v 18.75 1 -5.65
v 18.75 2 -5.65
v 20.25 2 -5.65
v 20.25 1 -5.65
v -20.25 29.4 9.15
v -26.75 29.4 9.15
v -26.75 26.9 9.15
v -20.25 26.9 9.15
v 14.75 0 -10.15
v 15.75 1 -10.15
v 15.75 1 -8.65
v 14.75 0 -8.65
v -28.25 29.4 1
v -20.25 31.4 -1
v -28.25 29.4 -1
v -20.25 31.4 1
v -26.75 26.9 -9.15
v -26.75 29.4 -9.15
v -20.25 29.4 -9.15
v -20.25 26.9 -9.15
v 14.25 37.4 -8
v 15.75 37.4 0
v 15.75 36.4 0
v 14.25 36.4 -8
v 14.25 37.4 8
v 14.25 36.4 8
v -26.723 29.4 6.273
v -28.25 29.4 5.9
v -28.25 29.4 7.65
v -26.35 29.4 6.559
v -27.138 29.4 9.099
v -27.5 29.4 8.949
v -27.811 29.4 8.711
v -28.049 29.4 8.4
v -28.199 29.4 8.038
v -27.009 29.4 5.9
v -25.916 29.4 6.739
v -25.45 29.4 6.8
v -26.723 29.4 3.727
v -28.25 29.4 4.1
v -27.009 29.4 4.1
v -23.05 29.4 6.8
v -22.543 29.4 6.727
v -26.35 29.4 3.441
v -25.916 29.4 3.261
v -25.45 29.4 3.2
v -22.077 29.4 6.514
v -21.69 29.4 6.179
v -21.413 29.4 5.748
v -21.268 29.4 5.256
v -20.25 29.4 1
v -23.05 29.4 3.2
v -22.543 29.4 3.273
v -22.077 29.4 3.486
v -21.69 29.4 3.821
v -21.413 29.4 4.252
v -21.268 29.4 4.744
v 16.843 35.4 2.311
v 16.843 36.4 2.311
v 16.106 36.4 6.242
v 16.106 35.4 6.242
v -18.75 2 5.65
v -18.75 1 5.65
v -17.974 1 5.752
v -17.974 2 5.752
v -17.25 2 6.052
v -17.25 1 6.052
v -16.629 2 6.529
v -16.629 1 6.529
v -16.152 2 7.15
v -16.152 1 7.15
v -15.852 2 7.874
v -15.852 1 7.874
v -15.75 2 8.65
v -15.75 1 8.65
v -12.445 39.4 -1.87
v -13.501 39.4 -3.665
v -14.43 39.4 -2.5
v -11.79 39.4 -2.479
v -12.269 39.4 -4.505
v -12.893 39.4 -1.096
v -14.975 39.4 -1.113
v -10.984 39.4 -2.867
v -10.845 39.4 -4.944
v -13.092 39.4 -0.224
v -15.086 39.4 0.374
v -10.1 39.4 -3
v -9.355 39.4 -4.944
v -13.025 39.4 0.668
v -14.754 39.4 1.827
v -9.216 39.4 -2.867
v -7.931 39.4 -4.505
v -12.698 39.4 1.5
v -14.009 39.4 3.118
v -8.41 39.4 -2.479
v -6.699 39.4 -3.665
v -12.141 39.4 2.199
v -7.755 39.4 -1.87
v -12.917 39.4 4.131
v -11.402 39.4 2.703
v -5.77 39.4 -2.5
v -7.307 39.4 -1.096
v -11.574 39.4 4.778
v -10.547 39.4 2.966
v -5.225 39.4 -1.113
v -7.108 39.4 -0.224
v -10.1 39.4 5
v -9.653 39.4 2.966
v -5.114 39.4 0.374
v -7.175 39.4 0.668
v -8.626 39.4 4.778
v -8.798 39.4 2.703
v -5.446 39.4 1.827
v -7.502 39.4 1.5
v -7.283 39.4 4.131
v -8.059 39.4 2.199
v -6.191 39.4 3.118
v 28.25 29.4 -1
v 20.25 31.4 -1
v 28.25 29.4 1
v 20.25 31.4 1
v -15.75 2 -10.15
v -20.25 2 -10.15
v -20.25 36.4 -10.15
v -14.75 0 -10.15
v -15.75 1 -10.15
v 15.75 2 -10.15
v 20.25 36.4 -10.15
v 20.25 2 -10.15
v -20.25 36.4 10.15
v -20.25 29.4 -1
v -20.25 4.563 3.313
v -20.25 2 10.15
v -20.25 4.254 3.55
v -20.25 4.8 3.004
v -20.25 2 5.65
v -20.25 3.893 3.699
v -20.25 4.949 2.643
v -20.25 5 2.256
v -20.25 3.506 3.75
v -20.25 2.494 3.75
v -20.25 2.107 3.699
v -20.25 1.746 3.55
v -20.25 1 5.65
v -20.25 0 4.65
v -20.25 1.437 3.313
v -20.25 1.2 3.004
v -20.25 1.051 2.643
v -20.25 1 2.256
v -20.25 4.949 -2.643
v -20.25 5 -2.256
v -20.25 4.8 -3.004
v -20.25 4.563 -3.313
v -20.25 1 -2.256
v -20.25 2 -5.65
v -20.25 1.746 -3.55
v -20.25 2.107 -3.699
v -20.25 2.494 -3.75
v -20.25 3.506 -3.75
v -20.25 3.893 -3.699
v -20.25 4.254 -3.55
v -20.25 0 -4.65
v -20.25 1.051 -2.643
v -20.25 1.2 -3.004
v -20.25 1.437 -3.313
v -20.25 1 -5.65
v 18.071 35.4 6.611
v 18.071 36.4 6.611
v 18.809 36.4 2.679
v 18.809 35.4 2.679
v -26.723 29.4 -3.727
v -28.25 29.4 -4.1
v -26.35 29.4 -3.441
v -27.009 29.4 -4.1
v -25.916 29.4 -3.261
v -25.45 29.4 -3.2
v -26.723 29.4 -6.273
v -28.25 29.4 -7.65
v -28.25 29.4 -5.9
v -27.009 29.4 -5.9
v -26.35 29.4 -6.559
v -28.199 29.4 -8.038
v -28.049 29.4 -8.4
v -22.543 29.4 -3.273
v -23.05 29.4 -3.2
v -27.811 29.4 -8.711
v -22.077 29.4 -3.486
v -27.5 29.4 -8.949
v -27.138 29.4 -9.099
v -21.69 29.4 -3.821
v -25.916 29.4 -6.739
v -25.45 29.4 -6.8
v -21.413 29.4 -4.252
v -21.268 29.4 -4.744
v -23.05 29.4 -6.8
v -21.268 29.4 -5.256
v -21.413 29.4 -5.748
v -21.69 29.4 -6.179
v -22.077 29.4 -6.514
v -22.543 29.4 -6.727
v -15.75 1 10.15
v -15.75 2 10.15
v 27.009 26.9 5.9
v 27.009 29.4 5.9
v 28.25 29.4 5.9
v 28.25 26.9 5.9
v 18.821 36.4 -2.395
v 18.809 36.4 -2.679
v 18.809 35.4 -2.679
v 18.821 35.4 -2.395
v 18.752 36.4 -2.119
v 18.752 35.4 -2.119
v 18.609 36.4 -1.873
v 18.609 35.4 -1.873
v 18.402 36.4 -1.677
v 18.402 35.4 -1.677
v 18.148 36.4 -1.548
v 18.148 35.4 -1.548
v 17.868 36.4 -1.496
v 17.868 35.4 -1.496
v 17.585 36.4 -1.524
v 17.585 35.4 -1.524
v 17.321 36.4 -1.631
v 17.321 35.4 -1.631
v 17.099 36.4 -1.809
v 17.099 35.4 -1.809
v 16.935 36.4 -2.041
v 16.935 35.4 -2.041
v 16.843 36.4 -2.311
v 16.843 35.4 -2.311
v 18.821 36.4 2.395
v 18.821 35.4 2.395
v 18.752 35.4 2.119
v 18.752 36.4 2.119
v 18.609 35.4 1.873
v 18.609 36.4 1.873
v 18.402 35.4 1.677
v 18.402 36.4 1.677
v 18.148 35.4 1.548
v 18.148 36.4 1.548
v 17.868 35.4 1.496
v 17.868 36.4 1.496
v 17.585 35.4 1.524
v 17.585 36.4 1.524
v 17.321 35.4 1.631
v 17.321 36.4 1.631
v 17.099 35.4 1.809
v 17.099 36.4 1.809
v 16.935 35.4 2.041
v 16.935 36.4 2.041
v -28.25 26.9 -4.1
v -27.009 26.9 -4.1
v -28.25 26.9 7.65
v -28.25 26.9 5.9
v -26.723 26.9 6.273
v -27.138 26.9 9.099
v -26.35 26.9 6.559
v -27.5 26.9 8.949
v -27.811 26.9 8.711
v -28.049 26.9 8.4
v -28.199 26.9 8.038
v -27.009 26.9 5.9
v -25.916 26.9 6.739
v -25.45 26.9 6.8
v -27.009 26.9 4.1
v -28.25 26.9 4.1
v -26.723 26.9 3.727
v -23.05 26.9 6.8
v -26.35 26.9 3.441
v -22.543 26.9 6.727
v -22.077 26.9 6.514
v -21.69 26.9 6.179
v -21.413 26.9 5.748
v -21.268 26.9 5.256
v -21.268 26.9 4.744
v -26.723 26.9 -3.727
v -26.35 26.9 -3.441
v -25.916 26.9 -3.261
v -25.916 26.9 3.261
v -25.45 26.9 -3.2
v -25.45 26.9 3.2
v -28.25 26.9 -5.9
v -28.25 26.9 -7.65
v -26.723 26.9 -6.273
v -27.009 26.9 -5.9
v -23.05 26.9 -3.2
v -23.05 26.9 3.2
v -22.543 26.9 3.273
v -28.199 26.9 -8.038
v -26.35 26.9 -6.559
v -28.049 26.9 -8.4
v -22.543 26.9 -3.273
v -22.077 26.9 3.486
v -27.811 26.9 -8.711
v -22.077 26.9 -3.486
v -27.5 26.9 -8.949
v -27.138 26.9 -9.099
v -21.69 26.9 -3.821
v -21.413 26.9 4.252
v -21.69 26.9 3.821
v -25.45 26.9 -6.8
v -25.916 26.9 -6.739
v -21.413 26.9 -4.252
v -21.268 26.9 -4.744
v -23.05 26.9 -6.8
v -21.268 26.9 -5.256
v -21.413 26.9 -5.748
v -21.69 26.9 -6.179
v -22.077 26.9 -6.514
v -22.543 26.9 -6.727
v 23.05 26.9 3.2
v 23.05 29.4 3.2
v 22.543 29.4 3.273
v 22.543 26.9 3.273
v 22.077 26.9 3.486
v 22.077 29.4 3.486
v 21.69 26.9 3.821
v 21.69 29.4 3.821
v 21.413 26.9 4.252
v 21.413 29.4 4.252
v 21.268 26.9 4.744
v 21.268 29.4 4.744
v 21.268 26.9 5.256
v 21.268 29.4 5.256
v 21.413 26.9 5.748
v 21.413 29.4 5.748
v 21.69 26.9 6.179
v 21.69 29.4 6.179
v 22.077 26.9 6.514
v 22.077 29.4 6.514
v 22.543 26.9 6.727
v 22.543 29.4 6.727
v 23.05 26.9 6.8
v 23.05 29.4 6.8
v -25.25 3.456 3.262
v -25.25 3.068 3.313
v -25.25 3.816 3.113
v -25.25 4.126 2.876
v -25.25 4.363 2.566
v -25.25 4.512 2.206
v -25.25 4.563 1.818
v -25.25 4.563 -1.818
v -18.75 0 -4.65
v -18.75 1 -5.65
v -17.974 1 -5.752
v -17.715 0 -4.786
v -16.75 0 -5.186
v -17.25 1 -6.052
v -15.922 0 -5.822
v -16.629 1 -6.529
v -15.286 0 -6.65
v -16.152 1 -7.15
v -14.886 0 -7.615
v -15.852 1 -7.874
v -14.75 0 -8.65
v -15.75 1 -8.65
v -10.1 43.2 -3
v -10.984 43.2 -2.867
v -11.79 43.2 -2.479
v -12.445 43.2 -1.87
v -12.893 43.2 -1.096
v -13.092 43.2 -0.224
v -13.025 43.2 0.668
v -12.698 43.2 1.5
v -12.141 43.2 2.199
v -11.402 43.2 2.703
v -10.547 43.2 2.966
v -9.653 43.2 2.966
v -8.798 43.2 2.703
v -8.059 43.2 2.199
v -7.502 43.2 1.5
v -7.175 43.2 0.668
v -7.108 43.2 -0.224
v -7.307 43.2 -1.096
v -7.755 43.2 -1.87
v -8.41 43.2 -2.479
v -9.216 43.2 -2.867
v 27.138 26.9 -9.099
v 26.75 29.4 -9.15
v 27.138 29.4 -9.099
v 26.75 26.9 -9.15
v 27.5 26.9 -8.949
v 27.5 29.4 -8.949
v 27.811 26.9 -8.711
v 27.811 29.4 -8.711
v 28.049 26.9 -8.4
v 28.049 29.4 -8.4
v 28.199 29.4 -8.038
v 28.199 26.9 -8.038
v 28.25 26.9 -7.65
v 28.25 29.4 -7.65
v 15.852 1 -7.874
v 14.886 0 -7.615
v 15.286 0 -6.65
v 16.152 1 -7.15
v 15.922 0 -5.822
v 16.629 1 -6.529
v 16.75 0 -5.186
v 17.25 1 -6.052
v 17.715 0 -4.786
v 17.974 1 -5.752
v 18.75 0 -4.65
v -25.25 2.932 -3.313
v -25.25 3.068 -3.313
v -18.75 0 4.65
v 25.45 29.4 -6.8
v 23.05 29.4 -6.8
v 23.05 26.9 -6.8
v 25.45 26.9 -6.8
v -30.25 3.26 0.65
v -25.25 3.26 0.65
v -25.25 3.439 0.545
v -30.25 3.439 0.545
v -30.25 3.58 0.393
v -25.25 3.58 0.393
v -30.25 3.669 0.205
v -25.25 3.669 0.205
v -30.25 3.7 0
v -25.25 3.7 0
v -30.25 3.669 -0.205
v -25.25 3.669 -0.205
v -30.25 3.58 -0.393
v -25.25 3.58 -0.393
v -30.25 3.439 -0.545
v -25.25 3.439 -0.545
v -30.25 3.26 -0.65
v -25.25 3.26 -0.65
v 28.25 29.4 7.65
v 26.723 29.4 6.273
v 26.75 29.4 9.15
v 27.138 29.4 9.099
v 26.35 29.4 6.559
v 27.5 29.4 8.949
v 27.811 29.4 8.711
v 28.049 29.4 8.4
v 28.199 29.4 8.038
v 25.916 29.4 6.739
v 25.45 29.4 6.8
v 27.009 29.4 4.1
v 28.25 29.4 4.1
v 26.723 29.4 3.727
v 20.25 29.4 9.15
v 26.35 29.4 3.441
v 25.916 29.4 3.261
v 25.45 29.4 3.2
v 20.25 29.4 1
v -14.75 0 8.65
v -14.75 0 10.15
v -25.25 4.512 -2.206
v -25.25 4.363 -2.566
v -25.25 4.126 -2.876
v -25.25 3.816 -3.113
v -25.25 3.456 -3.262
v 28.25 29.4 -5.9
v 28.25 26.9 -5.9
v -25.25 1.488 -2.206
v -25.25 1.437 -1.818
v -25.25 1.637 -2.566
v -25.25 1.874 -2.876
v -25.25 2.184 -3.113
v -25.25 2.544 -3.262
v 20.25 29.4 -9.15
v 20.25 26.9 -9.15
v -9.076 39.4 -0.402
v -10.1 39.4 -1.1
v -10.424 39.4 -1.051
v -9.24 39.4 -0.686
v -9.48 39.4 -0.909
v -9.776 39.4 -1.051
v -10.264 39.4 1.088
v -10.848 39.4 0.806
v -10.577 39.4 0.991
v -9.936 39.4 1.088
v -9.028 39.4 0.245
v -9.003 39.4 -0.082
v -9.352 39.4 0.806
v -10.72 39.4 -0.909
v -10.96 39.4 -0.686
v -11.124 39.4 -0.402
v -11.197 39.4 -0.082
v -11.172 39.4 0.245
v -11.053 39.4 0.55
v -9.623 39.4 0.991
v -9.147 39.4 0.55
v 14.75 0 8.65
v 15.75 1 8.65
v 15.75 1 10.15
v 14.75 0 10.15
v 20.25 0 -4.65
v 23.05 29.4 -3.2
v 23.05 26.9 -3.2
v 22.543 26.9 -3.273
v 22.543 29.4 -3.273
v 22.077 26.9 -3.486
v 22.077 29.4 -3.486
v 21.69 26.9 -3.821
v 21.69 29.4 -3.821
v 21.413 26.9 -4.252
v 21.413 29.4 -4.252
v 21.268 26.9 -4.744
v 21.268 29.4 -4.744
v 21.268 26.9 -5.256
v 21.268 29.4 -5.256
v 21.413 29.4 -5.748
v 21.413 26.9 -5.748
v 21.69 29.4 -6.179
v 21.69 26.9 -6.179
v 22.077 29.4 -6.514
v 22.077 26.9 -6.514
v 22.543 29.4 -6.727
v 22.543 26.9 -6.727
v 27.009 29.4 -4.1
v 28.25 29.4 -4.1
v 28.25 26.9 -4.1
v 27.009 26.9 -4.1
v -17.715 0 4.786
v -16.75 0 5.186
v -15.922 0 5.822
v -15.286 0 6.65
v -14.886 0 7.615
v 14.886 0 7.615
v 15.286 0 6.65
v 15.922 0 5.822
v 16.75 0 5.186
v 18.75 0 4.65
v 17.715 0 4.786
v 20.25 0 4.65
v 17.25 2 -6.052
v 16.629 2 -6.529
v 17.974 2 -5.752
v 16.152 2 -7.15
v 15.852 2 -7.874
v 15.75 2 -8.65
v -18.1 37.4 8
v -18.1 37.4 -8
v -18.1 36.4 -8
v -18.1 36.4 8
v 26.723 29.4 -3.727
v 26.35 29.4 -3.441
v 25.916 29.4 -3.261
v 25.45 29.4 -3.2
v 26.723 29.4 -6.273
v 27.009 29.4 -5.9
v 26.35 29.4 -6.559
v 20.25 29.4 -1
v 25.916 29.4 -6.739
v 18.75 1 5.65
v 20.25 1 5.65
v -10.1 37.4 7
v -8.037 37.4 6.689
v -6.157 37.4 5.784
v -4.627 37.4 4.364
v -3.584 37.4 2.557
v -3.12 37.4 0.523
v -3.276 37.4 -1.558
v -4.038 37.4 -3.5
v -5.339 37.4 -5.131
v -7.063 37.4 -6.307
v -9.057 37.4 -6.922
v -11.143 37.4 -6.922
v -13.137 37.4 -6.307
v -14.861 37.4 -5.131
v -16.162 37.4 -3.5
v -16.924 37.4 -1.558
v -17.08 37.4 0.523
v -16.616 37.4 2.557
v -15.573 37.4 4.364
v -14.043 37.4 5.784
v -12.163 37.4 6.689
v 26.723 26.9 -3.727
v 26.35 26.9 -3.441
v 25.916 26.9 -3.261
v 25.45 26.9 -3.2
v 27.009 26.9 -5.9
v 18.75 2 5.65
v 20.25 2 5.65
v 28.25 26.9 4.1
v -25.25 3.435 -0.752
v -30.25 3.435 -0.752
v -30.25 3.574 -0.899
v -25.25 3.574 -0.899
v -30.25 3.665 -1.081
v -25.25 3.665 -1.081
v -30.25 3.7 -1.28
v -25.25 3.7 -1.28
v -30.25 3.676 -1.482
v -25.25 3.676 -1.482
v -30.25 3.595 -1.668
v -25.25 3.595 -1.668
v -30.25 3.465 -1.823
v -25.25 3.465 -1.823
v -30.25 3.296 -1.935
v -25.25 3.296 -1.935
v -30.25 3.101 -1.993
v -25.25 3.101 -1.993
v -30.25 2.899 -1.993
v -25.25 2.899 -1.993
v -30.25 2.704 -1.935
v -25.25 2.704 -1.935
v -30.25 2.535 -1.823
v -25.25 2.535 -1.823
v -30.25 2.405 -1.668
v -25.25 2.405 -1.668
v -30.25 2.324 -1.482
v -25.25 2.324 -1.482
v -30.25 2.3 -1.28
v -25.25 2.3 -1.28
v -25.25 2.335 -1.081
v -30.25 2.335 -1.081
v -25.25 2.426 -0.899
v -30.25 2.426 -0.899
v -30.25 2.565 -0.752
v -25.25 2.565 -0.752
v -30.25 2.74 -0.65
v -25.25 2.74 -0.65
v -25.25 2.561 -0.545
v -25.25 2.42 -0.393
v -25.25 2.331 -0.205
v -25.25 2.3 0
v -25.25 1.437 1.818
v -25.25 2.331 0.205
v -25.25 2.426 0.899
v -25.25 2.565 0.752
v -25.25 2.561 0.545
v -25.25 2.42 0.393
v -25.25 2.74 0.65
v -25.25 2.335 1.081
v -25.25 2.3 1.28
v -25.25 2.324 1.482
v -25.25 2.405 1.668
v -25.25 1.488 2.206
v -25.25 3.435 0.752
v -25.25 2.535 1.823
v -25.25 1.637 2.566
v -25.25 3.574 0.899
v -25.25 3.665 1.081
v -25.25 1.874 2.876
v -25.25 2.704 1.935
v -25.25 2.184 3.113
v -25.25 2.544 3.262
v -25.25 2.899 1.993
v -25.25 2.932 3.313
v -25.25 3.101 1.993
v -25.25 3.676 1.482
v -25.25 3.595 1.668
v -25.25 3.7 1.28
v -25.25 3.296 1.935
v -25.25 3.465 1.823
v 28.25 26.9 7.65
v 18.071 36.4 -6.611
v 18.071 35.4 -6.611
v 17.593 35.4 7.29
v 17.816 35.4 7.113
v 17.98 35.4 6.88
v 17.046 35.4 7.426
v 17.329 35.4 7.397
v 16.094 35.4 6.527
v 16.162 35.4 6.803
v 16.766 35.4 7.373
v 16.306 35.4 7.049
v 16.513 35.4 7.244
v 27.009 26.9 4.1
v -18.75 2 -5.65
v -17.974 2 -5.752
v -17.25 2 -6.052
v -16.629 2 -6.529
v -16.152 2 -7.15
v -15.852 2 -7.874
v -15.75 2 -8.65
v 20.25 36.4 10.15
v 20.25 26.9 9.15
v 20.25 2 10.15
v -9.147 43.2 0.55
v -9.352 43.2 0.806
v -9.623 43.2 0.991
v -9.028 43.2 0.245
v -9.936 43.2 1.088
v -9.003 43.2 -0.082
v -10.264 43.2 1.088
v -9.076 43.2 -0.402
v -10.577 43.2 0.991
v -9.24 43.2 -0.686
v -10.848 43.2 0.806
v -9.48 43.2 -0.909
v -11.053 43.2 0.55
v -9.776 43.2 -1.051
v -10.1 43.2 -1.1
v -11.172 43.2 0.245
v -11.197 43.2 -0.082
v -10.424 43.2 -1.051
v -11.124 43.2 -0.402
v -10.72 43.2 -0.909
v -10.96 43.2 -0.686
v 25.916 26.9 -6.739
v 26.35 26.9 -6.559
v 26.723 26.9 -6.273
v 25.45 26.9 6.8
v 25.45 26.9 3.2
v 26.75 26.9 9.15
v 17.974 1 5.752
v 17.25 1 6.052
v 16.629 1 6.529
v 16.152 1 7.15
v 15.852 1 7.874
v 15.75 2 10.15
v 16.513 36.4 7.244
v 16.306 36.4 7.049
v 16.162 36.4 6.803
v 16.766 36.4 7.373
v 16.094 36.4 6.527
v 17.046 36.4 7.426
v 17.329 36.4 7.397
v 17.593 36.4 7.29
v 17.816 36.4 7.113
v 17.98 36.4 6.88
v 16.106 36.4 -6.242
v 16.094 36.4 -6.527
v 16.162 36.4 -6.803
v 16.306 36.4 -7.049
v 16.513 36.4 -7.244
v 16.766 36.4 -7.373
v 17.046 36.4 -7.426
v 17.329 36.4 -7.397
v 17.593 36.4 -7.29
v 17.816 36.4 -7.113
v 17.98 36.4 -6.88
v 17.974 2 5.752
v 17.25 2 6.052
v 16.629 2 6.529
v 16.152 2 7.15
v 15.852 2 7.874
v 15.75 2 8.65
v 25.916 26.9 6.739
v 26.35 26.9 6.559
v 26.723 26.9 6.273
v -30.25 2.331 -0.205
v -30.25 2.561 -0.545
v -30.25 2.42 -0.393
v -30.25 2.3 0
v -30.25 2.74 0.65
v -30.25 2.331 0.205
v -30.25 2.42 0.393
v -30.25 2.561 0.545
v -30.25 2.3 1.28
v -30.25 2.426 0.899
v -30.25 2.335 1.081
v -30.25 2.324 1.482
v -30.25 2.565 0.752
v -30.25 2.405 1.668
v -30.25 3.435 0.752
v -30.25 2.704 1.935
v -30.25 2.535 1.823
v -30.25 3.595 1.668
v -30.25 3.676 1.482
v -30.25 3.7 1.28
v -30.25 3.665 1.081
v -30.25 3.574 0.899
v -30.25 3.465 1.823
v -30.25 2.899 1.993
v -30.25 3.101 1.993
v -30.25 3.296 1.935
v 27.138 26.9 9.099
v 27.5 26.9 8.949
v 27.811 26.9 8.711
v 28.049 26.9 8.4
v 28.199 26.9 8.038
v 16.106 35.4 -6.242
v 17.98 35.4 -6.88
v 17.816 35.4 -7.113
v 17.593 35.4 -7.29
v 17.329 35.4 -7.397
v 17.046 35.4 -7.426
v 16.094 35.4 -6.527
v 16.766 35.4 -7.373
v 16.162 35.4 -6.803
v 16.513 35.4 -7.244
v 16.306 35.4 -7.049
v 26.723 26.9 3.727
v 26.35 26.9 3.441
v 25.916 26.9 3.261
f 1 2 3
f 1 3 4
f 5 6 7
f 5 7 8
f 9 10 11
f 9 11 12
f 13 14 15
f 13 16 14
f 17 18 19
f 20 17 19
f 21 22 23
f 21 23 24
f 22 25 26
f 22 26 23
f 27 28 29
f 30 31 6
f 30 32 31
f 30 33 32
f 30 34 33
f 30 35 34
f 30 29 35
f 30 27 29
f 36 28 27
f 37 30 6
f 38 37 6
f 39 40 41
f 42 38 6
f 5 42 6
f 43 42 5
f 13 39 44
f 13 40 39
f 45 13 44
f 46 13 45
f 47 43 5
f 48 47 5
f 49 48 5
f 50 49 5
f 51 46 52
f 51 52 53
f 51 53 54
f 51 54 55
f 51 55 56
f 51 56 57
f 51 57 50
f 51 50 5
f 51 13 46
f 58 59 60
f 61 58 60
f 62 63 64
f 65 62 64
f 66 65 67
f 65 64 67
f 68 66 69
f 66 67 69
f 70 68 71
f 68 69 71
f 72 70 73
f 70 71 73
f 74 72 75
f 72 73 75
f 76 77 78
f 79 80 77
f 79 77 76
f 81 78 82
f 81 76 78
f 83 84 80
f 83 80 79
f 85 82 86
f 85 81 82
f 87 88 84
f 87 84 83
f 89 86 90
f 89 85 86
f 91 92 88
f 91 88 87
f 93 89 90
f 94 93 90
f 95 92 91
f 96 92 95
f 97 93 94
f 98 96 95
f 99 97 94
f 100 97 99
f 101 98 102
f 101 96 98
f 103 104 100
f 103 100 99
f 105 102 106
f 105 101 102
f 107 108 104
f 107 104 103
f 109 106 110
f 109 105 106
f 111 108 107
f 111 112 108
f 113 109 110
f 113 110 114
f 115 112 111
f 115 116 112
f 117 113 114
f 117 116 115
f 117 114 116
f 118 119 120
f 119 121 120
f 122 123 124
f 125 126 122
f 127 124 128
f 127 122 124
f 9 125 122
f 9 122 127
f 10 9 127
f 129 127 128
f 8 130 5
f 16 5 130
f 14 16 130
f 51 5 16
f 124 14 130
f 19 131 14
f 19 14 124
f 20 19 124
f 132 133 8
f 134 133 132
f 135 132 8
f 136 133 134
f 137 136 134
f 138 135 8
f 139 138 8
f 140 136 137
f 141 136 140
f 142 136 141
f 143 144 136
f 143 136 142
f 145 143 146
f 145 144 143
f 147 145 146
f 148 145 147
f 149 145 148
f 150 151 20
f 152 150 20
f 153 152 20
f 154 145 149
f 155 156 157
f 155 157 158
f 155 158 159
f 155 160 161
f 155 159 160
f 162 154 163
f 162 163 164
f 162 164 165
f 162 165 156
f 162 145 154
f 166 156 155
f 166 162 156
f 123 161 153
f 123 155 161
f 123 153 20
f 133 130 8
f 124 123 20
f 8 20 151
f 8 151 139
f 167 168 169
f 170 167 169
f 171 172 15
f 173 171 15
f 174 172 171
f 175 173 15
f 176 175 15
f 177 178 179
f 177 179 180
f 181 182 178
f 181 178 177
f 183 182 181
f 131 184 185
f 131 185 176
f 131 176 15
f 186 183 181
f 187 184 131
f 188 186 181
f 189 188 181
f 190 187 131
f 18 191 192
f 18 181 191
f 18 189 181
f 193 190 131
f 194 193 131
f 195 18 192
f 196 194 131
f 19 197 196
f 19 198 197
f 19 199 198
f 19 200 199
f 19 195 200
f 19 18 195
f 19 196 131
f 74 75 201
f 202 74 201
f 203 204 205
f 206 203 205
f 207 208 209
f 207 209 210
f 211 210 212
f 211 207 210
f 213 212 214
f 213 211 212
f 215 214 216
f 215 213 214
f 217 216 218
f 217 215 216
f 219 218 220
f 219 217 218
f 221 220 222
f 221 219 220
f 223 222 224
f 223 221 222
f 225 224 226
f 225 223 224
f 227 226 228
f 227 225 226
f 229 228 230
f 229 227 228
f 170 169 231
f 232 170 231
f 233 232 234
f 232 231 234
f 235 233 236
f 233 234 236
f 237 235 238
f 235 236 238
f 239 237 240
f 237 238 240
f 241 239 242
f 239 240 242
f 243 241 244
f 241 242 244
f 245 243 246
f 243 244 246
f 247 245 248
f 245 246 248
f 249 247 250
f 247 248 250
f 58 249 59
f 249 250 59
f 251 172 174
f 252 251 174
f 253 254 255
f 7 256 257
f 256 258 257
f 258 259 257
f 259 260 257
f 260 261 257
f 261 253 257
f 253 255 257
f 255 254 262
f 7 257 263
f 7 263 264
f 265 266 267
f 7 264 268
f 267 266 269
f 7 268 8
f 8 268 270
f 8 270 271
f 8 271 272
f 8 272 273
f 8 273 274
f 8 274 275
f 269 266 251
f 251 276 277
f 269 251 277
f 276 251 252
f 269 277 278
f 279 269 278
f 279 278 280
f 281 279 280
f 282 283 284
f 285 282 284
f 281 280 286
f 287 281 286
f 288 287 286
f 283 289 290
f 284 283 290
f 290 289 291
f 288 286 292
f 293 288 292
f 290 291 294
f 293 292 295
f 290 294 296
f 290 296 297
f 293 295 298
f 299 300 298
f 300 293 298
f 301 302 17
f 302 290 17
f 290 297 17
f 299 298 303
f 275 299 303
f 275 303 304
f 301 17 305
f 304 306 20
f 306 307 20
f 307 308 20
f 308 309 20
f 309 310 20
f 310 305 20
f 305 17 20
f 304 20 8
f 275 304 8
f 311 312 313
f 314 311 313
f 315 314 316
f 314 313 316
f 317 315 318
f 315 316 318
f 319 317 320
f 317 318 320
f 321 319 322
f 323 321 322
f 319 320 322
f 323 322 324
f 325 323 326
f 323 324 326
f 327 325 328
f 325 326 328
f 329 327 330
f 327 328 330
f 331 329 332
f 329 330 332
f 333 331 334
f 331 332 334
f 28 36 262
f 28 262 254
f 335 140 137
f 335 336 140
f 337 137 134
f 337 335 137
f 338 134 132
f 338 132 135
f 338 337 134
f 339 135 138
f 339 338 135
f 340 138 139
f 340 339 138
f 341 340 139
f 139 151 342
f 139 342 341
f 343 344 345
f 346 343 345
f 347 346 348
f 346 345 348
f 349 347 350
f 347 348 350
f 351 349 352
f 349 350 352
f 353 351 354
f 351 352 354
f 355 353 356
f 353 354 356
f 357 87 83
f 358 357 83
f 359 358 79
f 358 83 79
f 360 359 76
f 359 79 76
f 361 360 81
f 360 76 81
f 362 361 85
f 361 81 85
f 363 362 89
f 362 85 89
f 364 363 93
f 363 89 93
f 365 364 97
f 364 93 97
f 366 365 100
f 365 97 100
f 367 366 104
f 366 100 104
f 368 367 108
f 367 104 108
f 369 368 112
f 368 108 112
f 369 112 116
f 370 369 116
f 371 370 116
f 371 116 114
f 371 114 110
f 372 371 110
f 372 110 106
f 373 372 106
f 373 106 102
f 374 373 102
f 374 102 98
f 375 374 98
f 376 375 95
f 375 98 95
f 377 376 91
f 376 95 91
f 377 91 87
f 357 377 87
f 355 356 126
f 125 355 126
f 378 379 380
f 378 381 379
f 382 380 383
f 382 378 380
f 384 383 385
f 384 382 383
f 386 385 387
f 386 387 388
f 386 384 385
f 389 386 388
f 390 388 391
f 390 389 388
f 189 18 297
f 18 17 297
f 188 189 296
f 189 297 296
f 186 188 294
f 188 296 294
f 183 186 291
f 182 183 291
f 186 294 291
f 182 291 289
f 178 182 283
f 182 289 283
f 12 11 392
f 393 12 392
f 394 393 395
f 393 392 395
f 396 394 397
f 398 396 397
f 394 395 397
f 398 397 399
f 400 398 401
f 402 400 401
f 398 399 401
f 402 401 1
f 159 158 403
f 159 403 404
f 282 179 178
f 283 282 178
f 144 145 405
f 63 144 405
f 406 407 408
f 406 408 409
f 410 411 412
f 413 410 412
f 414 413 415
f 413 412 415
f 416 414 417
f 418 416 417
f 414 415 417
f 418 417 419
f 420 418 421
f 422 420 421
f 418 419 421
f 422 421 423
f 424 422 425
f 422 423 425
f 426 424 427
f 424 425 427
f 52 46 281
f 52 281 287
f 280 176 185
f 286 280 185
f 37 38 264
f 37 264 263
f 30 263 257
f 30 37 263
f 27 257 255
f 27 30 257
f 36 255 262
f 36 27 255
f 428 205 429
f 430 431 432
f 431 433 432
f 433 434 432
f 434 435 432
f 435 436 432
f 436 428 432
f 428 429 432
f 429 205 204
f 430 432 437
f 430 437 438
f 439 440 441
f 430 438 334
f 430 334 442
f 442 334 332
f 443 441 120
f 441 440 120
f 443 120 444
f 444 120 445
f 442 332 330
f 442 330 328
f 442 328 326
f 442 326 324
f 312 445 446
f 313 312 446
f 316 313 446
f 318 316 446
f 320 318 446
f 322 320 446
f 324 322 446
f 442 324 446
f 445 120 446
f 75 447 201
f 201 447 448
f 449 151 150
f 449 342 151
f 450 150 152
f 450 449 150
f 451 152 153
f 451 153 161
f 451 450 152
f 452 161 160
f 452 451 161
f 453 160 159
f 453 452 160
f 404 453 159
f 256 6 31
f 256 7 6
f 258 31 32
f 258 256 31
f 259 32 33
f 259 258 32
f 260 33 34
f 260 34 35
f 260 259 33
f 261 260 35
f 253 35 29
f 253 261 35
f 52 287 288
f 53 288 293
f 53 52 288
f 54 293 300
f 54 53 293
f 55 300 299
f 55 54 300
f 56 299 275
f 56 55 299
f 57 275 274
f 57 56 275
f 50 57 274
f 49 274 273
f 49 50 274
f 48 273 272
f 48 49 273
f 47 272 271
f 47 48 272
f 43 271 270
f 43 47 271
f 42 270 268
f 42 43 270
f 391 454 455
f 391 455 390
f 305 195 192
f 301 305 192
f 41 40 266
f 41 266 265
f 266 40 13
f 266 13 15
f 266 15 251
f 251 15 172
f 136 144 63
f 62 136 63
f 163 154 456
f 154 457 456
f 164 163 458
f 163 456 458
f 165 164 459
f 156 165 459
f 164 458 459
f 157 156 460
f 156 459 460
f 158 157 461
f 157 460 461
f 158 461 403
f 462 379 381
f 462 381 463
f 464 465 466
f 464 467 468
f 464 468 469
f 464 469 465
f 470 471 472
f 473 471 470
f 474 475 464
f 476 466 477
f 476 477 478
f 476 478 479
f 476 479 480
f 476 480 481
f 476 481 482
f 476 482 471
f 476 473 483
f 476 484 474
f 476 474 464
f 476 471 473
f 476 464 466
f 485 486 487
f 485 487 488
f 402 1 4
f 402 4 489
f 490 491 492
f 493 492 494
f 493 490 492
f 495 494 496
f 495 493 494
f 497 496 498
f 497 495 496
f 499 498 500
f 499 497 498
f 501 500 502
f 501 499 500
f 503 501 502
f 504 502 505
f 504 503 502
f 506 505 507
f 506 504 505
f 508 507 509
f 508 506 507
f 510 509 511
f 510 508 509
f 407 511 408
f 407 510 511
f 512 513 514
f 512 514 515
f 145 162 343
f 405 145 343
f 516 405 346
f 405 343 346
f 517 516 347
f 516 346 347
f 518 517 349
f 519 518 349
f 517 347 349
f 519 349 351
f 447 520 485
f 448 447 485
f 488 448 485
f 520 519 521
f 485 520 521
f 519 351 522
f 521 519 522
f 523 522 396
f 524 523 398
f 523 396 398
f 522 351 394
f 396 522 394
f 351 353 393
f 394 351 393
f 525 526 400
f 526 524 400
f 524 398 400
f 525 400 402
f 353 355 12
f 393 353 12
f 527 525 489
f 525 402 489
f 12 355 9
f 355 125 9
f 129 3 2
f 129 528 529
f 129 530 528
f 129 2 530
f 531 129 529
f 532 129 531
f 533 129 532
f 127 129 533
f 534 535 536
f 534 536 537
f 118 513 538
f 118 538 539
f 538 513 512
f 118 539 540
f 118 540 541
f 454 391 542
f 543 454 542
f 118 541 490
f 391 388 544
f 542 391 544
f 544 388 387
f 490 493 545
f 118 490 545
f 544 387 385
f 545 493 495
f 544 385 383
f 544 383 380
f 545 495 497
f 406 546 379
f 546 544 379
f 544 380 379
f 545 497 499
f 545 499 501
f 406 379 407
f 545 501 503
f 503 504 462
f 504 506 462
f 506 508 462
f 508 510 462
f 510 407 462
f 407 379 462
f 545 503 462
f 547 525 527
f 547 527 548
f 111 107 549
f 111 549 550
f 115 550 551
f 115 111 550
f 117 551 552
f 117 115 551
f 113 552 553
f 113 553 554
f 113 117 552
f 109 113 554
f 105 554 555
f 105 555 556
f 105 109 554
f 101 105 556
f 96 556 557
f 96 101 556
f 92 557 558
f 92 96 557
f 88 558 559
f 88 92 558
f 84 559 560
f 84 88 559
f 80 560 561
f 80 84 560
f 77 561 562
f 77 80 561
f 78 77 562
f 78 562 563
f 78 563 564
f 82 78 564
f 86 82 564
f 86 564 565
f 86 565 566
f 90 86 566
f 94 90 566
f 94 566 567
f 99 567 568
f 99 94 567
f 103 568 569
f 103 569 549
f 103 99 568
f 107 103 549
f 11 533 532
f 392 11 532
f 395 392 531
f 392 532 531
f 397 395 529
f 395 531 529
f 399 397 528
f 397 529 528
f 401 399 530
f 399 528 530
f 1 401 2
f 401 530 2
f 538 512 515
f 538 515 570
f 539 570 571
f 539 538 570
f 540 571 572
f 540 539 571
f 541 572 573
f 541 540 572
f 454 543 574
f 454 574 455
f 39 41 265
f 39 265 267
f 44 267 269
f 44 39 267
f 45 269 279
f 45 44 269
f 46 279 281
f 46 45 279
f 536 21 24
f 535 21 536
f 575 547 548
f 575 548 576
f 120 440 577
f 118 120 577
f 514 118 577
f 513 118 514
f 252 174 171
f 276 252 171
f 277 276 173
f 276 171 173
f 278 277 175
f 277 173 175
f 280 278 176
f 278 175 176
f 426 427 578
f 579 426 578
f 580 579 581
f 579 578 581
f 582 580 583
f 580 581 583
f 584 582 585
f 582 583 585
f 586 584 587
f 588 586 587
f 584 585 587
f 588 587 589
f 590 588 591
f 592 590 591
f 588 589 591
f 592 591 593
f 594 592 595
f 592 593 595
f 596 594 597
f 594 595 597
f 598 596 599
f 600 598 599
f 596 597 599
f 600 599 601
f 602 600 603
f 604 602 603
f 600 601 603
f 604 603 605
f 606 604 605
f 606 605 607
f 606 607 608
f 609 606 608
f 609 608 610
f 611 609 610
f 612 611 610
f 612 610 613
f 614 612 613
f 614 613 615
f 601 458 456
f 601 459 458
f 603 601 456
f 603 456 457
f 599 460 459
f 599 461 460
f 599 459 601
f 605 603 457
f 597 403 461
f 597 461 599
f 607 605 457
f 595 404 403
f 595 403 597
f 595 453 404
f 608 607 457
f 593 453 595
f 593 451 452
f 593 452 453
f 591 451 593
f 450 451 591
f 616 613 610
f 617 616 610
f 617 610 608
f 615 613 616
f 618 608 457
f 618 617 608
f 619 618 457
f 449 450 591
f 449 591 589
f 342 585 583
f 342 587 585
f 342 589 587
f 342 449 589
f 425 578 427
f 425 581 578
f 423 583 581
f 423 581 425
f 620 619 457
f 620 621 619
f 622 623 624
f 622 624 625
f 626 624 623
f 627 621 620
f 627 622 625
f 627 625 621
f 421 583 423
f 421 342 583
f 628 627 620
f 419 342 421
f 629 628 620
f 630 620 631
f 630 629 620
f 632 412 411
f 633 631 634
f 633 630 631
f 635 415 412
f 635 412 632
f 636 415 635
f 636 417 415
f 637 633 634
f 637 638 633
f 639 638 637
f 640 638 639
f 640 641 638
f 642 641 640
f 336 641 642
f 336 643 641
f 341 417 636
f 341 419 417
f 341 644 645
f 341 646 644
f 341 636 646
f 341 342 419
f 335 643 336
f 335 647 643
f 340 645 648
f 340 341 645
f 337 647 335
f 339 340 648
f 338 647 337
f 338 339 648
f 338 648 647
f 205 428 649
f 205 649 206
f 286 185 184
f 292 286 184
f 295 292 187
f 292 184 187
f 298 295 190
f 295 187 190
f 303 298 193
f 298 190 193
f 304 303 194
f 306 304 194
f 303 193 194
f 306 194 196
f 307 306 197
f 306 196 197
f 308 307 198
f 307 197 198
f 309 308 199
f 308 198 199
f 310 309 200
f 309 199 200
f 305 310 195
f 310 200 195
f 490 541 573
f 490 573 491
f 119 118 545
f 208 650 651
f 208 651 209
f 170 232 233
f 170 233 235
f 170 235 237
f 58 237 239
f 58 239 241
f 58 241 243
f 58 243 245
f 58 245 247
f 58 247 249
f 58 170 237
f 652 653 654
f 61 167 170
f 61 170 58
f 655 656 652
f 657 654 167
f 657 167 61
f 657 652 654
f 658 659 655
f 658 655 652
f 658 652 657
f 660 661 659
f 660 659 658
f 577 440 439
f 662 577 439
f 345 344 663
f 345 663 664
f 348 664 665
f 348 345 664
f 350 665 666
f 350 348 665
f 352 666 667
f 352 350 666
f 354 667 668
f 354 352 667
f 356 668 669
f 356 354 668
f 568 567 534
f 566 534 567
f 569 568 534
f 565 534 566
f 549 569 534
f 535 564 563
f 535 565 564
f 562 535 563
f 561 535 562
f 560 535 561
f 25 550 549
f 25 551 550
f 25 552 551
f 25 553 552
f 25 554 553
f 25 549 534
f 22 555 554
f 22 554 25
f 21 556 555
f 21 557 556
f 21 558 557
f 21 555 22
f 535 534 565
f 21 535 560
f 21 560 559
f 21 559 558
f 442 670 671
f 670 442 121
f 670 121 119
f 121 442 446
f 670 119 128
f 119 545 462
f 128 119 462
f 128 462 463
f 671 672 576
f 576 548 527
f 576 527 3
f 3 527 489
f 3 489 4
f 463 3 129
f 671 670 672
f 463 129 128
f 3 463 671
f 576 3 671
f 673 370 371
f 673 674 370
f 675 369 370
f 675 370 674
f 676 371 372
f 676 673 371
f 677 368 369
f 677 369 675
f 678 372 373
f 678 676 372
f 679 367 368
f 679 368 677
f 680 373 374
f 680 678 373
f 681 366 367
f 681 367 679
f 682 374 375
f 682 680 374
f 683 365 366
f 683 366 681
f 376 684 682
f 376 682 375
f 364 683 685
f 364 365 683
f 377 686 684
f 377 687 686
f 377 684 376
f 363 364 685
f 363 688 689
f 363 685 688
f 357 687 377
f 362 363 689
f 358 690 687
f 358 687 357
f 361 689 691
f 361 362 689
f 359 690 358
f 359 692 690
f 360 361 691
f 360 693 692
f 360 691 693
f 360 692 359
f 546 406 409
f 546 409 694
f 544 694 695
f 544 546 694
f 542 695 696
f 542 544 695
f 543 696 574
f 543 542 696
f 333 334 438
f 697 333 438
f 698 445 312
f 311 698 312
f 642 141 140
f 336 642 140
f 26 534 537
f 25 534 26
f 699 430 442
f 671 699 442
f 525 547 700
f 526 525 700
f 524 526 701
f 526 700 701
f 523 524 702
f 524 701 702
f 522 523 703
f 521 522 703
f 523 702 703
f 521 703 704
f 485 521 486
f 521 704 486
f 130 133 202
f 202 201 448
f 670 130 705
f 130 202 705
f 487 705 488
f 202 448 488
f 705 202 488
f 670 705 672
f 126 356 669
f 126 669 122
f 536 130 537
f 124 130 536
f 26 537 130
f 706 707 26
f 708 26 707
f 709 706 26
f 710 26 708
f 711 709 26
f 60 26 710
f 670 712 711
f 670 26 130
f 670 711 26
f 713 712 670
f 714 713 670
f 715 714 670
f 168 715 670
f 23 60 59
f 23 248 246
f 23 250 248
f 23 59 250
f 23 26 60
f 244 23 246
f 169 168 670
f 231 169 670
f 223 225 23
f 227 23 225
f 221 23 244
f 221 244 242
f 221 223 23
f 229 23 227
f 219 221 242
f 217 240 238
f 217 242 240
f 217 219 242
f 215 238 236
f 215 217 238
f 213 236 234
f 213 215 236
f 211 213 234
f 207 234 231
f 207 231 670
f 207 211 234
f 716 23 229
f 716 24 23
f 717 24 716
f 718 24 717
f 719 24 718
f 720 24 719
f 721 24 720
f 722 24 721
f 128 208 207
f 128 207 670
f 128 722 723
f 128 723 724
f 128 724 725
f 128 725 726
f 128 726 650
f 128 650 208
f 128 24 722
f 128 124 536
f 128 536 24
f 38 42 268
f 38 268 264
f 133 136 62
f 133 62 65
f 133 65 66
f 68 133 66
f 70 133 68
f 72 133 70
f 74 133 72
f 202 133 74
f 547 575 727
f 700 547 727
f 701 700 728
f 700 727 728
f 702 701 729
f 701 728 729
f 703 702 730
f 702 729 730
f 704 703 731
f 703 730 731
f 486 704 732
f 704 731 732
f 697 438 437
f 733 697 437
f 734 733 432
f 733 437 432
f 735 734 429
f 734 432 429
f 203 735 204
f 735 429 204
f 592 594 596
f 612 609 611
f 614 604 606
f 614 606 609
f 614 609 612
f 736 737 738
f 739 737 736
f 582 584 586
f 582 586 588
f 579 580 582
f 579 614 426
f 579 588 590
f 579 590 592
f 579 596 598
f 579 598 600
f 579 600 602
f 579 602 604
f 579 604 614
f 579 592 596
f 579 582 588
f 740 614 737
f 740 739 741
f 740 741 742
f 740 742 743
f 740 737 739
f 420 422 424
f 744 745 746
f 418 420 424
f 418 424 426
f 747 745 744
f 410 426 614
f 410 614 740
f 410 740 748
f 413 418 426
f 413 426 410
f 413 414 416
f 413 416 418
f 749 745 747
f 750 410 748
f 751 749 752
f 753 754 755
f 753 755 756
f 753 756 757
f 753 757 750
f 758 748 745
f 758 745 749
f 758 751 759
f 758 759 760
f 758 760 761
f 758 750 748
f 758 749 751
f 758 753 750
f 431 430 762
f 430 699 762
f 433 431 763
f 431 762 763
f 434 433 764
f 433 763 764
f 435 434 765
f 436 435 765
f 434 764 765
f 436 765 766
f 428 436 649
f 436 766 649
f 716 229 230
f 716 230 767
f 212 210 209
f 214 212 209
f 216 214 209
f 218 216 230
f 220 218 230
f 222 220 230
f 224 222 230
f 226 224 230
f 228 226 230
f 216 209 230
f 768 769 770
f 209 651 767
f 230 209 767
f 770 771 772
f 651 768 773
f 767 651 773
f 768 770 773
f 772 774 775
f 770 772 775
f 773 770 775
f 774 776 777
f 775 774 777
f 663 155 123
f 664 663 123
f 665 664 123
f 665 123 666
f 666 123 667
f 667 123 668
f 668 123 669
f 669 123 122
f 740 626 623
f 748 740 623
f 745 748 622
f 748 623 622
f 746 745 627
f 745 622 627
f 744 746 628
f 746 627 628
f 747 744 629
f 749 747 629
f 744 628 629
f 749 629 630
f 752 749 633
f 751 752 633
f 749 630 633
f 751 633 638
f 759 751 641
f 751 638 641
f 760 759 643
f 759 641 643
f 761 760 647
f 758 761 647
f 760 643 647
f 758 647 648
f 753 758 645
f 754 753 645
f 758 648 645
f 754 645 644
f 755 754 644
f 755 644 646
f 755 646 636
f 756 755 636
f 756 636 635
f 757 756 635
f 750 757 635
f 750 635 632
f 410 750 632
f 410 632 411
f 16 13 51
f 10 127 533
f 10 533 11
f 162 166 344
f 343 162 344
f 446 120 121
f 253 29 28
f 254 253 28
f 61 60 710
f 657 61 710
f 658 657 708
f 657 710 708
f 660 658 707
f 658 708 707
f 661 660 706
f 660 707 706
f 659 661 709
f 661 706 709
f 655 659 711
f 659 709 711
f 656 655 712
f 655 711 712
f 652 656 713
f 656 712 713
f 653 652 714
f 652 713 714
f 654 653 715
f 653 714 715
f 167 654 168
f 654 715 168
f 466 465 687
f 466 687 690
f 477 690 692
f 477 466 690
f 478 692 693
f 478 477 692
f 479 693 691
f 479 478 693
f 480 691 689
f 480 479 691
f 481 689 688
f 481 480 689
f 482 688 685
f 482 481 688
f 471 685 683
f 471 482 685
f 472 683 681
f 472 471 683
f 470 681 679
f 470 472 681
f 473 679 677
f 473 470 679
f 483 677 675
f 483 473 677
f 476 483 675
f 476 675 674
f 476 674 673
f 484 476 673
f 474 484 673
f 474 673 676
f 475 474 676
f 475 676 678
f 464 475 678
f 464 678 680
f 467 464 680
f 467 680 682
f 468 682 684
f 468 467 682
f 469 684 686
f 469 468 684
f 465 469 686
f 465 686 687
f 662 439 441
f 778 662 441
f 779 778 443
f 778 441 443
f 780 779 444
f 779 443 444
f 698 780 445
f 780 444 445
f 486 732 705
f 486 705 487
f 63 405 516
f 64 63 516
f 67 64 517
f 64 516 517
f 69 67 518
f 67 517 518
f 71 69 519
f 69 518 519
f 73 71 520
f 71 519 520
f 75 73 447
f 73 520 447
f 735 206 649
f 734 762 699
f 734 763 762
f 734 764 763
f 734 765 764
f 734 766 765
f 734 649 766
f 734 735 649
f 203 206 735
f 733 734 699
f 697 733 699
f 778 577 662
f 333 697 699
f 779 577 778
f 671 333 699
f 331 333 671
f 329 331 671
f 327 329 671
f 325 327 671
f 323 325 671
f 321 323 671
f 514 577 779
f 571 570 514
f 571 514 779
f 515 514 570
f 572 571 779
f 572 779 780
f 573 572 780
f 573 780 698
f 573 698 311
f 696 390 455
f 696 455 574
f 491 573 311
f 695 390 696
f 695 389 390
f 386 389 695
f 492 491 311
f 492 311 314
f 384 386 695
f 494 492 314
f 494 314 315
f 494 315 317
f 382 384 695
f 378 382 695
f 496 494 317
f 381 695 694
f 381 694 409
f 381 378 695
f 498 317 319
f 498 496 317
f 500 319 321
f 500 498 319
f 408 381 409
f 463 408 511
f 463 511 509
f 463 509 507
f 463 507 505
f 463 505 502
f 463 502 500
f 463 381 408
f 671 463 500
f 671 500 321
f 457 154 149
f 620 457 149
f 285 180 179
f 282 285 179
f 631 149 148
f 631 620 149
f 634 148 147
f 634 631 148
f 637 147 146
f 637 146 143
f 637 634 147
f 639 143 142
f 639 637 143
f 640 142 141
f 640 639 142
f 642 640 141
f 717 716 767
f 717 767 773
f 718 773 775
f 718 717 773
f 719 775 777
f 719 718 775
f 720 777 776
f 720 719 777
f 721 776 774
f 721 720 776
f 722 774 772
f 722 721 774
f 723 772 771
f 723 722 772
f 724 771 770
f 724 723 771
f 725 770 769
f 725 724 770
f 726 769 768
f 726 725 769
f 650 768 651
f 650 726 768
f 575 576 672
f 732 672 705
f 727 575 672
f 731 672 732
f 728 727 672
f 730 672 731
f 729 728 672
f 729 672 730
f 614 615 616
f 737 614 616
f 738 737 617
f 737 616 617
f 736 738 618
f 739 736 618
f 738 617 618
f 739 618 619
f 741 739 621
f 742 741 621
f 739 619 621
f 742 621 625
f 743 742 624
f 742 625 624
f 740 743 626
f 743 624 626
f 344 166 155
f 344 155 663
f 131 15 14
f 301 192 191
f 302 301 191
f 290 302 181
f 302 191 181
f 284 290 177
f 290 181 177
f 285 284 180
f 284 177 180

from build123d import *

# Parameters (mm, degrees)
SKETCH1_W                = 40.5
SKETCH1_H                = 20.3
BOSS_EXTRUDE1_DEPTH      = 37.4
SKETCH2_R                = 7
BOSS_EXTRUDE2_DEPTH      = 2
CHAMFER1_SIZE            = 2
SKETCH3_R                = 3
SKETCH3_R_2              = 1.1
BOSS_EXTRUDE3_DEPTH      = 3.8
SKETCH4_W                = 8
SKETCH4_H                = 18.3
BOSS_EXTRUDE4_DEPTH      = 2.5
CUT_EXTRUDE1_DEPTH       = 43.01719886
BOSS_EXTRUDE5_DEPTH      = 1
MIRROR3_COPY_1_DEPTH     = 43.01719886
FILLET2_R                = 1.5
SKETCH7_W                = 7.5
SKETCH7_H                = 4
BOSS_EXTRUDE6_DEPTH      = 5
BOSS_EXTRUDE7_DEPTH      = 5
DRAFT1_ANGLE             = 5
FILLET3_R                = 1.5
CUT_EXTRUDE2_DEPTH       = 2
CHAMFER2_SIZE            = 1
CHAMFER2_OF_MIRROR4_SIZE = 1
MIRROR5_START            = 18.75
MIRROR5_3_DEPTH          = 2.25
MIRROR5_START_2          = -11
MIRROR5_4_DEPTH          = 2.35
MIRROR5_START_3          = 8.65
MIRROR5_5_DEPTH          = 2.35
SKETCH10_W               = 40.5
SKETCH10_H               = 20.3
CUT_EXTRUDE3_DEPTH       = 1
CUT_EXTRUDE4_DEPTH       = 1


with BuildPart() as part:
    # Sketch1 → Boss-Extrude1 (new body)
    with BuildSketch(Plane(origin=(0, 0, 0), x_dir=(1, 0, 0), z_dir=(0, 1, 0))):
        Rectangle(SKETCH1_W, SKETCH1_H)
    extrude(amount=BOSS_EXTRUDE1_DEPTH)

    # Sketch2 → Boss-Extrude2 (add)
    with BuildSketch(Plane(origin=(0, 37.4, 0), x_dir=(1, 0, 0), z_dir=(0, 1, 0))):
        with Locations(Location((-10.1, 0, 0), (0, 0, 270))):
            Circle(SKETCH2_R)
    extrude(amount=BOSS_EXTRUDE2_DEPTH)

    # Chamfer1
    chamfer1_edges = [part.edges().sort_by_distance(p)[0] for p in [
        (-10.1, 39.4, -7),
    ]]
    chamfer(chamfer1_edges, length=CHAMFER1_SIZE - 0.0001)  # a hair under: the kernel refuses the full size

    # Sketch3 → Boss-Extrude3 (add)
    with BuildSketch(Plane(origin=(0, 39.4, 0), x_dir=(1, 0, 0), z_dir=(0, 1, 0))):
        with Locations(Location((-10.1, 0, 0), (0, 0, 90))):
            Circle(SKETCH3_R)
        with Locations(Location((-10.1, 0, 0), (0, 0, 90))):
            Circle(SKETCH3_R_2, mode=Mode.SUBTRACT)
    extrude(amount=BOSS_EXTRUDE3_DEPTH)

    # Sketch4 → Boss-Extrude4 (add)
    with BuildSketch(Plane(origin=(0, 29.4, 0), x_dir=(1, 0, 0), z_dir=(0, 1, 0))):
        with Locations((-24.25, 0)):
            Rectangle(SKETCH4_W, SKETCH4_H)
    boss_extrude4 = extrude(amount=-BOSS_EXTRUDE4_DEPTH)

    # Sketch5 → Cut-Extrude1 (cut, through all)
    with BuildSketch(Plane(origin=(0, 29.4, 0), x_dir=(1, 0, 0), z_dir=(0, 1, 0))):
        with BuildLine():
            Line((-25.45, -3.2), (-23.05, -3.2))
            ThreePointArc((-23.05, -3.2), (-21.25, -5), (-23.05, -6.8))
            Line((-23.05, -6.8), (-25.45, -6.8))
            ThreePointArc((-25.45, -6.8), (-26.35, -6.558845727), (-27.008845727, -5.9))
            Line((-27.008845727, -5.9), (-28.25, -5.9))
            Line((-28.25, -5.9), (-28.25, -4.1))
            Line((-28.25, -4.1), (-27.008845727, -4.1))
            ThreePointArc((-27.008845727, -4.1), (-26.35, -3.441154273), (-25.45, -3.2))
        make_face()
    cut_extrude1 = extrude(amount=-CUT_EXTRUDE1_DEPTH, mode=Mode.SUBTRACT)

    # Mirror2: Cut-Extrude1 across plane
    add(cut_extrude1.mirror(Plane.XY), mode=Mode.SUBTRACT)

    # Sketch6 → Boss-Extrude5 (add, symmetric)
    with BuildSketch(Plane.XY):
        Polygon((-28.25, 29.4), (-20.25, 29.4), (-20.25, 31.4), align=None)
    boss_extrude5 = extrude(amount=BOSS_EXTRUDE5_DEPTH, both=True)

    # Mirror3: Boss-Extrude4, Cut-Extrude1, Boss-Extrude5 across plane
    add(boss_extrude4.mirror(Plane(origin=(0, 0, 0), x_dir=(0, 0, 1), z_dir=(1, 0, 0))))
    add(cut_extrude1.mirror(Plane(origin=(0, 0, 0), x_dir=(0, 0, 1), z_dir=(1, 0, 0))), mode=Mode.SUBTRACT)
    add(boss_extrude5.mirror(Plane(origin=(0, 0, 0), x_dir=(0, 0, 1), z_dir=(1, 0, 0))))

    # Mirror3 copy 1 sketch → Mirror3 copy 1 (cut, through all)
    with BuildSketch(Plane(origin=(0, 29.4, 0), x_dir=(-1, 0, 0), z_dir=(0, 1, 0))):
        with BuildLine():
            Line((-25.45, -3.2), (-23.05, -3.2))
            ThreePointArc((-23.05, -3.2), (-21.25, -5), (-23.05, -6.8))
            Line((-23.05, -6.8), (-25.45, -6.8))
            ThreePointArc((-25.45, -6.8), (-26.35, -6.558845727), (-27.008845727, -5.9))
            Line((-27.008845727, -5.9), (-28.25, -5.9))
            Line((-28.25, -5.9), (-28.25, -4.1))
            Line((-28.25, -4.1), (-27.008845727, -4.1))
            ThreePointArc((-27.008845727, -4.1), (-26.35, -3.441154273), (-25.45, -3.2))
        make_face()
    extrude(amount=-MIRROR3_COPY_1_DEPTH, mode=Mode.SUBTRACT)

    # Fillet2
    fillet2_edges = [part.edges().sort_by_distance(p)[0] for p in [
        (28.25, 28.15, -9.15),
        (28.25, 28.15, 9.15),
        (-28.25, 28.15, 9.15),
        (-28.25, 28.15, -9.15),
    ]]
    fillet(fillet2_edges, radius=FILLET2_R)

    # Sketch7 → Boss-Extrude6 (add)
    with BuildSketch(Plane.ZY.offset(20.25)):
        with Locations((0, 3)):
            Rectangle(SKETCH7_W, SKETCH7_H)
    extrude(amount=BOSS_EXTRUDE6_DEPTH)

    # Sketch8 → Boss-Extrude7 (add)
    with BuildSketch(Plane.ZY.offset(25.25)):
        with BuildLine():
            ThreePointArc((-0.65, 3.259807621), (-2, 3), (-0.65, 2.740192379))
            ThreePointArc((-0.65, 2.740192379), (0, 2.3), (0.65, 2.740192379))
            ThreePointArc((0.65, 2.740192379), (2, 3), (0.65, 3.259807621))
            ThreePointArc((0.65, 3.259807621), (0, 3.7), (-0.65, 3.259807621))
        make_face()
    extrude(amount=BOSS_EXTRUDE7_DEPTH)

    # Draft1
    draft1_faces = [part.faces().sort_by_distance(p)[0] for p in [
        (-22.75, 1, 0),
        (-22.75, 3, -3.75),
        (-22.75, 3, 3.75),
        (-22.75, 5, 0),
    ]]
    draft(draft1_faces, Plane(origin=(-20.25, 37.4, -10.15), x_dir=(0, 0, -1), z_dir=(-1, 0, 0)), DRAFT1_ANGLE)

    # Fillet3
    fillet3_edges = [part.edges().sort_by_distance(p)[0] for p in [
        (-22.75, 4.781278341, -3.531278341),
        (-22.75, 1.218721659, -3.531278341),
        (-22.75, 1.218721659, 3.531278341),
        (-22.75, 4.781278341, 3.531278341),
    ]]
    fillet(fillet3_edges, radius=FILLET3_R)

    # Sketch9 → Cut-Extrude2 (cut)
    with BuildSketch(Plane.XZ):
        with BuildLine():
            Line((-20.25, 10.15), (-20.25, 5.65))
            Line((-20.25, 5.65), (-18.75, 5.65))
            ThreePointArc((-18.75, 5.65), (-16.628679656, 6.528679656), (-15.75, 8.65))
            Line((-15.75, 8.65), (-15.75, 10.15))
            Line((-15.75, 10.15), (-20.25, 10.15))
        make_face()
    cut_extrude2 = extrude(amount=-CUT_EXTRUDE2_DEPTH, mode=Mode.SUBTRACT)

    # Chamfer2
    chamfer2_edges = [part.edges().sort_by_distance(p)[0] for p in [
        (-19.5, 0, 5.65),
        (-16.628679656, 0, 6.528679656),
        (-15.75, 0, 9.4),
    ]]
    chamfer(chamfer2_edges, length=CHAMFER2_SIZE)

    # Mirror4: Cut-Extrude2 across plane
    add(cut_extrude2.mirror(Plane.XY), mode=Mode.SUBTRACT)

    # Chamfer2 of Mirror4
    chamfer2_of_mirror4_edges = [part.edges().sort_by_distance(p)[0] for p in [
        (-19.5, 0, -5.65),
        (-16.628679656, 0, -6.528679656),
        (-15.75, 0, -9.4),
    ]]
    chamfer(chamfer2_of_mirror4_edges, length=CHAMFER2_OF_MIRROR4_SIZE)

    # Mirror5: read off the stored shape, not the designer's step
    # Mirror5 outline → Mirror5 (revolve, cut)
    with BuildSketch(Plane(origin=(18.75, 0, -8.65), x_dir=(1, 0, 0), z_dir=(0, 0, 1))):
        Polygon((3, 1), (3, 2), (0, 2), (0, 0), (4, 0), align=None)
    revolve(axis=Axis((18.75, 0, -8.65), (0, 1, 0)), mode=Mode.SUBTRACT)

    # Mirror5 2 outline → Mirror5 2 (revolve, cut)
    with BuildSketch(Plane(origin=(18.75, 0, 8.65), x_dir=(1, 0, 0), z_dir=(0, 0, 1))):
        Polygon((3, 1), (3, 2), (0, 2), (0, 0), (4, 0), align=None)
    revolve(axis=Axis((18.75, 0, 8.65), (0, 1, 0)), mode=Mode.SUBTRACT)

    # Mirror5 3 outline → Mirror5 3 (cut)
    with BuildSketch(Plane.YZ.offset(MIRROR5_START)):
        Polygon((1, -5.65), (0, -4.65), (0, -10.15), (2, -10.15), (2, -5.65), align=None)
        Polygon((1, 5.65), (2, 5.65), (2, 10.15), (0, 10.15), (0, 4.65), align=None)
    extrude(amount=MIRROR5_3_DEPTH, mode=Mode.SUBTRACT)

    # Mirror5 4 outline → Mirror5 4 (cut)
    with BuildSketch(Plane.XY.offset(MIRROR5_START_2)):
        Polygon((15.75, 2), (15.75, 1), (14.75, 0), (20.25, 0), (20.25, 2), align=None)
    extrude(amount=MIRROR5_4_DEPTH, mode=Mode.SUBTRACT)

    # Mirror5 5 outline → Mirror5 5 (cut)
    with BuildSketch(Plane.XY.offset(MIRROR5_START_3)):
        Polygon((15.75, 2), (15.75, 1), (14.75, 0), (20.25, 0), (20.25, 2), align=None)
    extrude(amount=MIRROR5_5_DEPTH, mode=Mode.SUBTRACT)

    # Sketch10 → Cut-Extrude3 (cut)
    with BuildSketch(Plane(origin=(0, 37.4, 0), x_dir=(1, 0, 0), z_dir=(0, 1, 0))):
        Rectangle(SKETCH10_W, SKETCH10_H)
        Polygon((-18.1, -8), (14.25, -8), (15.75, 0), (14.25, 8), (-18.1, 8), align=None, mode=Mode.SUBTRACT)
    extrude(amount=-CUT_EXTRUDE3_DEPTH, mode=Mode.SUBTRACT)

    # Sketch11 → Cut-Extrude4 (cut)
    with BuildSketch(Plane(origin=(0, 36.4, 0), x_dir=(1, 0, 0), z_dir=(0, 1, 0))):
        with BuildLine():
            Line((16.842885351, 2.310688429), (16.10573121, 6.242177176))
            ThreePointArc((16.10573121, 6.242177176), (16.904314862, 7.409337898), (18.071475584, 6.610754247))
            Line((18.071475584, 6.610754247), (18.808629724, 2.679265499))
            ThreePointArc((18.808629724, 2.679265499), (18.010046072, 1.512104777), (16.842885351, 2.310688429))
        make_face()
    cut_extrude4 = extrude(amount=-CUT_EXTRUDE4_DEPTH, mode=Mode.SUBTRACT)

    # Mirror6: Cut-Extrude4 across plane
    add(cut_extrude4.mirror(Plane.XY), mode=Mode.SUBTRACT)


solid = part.part
